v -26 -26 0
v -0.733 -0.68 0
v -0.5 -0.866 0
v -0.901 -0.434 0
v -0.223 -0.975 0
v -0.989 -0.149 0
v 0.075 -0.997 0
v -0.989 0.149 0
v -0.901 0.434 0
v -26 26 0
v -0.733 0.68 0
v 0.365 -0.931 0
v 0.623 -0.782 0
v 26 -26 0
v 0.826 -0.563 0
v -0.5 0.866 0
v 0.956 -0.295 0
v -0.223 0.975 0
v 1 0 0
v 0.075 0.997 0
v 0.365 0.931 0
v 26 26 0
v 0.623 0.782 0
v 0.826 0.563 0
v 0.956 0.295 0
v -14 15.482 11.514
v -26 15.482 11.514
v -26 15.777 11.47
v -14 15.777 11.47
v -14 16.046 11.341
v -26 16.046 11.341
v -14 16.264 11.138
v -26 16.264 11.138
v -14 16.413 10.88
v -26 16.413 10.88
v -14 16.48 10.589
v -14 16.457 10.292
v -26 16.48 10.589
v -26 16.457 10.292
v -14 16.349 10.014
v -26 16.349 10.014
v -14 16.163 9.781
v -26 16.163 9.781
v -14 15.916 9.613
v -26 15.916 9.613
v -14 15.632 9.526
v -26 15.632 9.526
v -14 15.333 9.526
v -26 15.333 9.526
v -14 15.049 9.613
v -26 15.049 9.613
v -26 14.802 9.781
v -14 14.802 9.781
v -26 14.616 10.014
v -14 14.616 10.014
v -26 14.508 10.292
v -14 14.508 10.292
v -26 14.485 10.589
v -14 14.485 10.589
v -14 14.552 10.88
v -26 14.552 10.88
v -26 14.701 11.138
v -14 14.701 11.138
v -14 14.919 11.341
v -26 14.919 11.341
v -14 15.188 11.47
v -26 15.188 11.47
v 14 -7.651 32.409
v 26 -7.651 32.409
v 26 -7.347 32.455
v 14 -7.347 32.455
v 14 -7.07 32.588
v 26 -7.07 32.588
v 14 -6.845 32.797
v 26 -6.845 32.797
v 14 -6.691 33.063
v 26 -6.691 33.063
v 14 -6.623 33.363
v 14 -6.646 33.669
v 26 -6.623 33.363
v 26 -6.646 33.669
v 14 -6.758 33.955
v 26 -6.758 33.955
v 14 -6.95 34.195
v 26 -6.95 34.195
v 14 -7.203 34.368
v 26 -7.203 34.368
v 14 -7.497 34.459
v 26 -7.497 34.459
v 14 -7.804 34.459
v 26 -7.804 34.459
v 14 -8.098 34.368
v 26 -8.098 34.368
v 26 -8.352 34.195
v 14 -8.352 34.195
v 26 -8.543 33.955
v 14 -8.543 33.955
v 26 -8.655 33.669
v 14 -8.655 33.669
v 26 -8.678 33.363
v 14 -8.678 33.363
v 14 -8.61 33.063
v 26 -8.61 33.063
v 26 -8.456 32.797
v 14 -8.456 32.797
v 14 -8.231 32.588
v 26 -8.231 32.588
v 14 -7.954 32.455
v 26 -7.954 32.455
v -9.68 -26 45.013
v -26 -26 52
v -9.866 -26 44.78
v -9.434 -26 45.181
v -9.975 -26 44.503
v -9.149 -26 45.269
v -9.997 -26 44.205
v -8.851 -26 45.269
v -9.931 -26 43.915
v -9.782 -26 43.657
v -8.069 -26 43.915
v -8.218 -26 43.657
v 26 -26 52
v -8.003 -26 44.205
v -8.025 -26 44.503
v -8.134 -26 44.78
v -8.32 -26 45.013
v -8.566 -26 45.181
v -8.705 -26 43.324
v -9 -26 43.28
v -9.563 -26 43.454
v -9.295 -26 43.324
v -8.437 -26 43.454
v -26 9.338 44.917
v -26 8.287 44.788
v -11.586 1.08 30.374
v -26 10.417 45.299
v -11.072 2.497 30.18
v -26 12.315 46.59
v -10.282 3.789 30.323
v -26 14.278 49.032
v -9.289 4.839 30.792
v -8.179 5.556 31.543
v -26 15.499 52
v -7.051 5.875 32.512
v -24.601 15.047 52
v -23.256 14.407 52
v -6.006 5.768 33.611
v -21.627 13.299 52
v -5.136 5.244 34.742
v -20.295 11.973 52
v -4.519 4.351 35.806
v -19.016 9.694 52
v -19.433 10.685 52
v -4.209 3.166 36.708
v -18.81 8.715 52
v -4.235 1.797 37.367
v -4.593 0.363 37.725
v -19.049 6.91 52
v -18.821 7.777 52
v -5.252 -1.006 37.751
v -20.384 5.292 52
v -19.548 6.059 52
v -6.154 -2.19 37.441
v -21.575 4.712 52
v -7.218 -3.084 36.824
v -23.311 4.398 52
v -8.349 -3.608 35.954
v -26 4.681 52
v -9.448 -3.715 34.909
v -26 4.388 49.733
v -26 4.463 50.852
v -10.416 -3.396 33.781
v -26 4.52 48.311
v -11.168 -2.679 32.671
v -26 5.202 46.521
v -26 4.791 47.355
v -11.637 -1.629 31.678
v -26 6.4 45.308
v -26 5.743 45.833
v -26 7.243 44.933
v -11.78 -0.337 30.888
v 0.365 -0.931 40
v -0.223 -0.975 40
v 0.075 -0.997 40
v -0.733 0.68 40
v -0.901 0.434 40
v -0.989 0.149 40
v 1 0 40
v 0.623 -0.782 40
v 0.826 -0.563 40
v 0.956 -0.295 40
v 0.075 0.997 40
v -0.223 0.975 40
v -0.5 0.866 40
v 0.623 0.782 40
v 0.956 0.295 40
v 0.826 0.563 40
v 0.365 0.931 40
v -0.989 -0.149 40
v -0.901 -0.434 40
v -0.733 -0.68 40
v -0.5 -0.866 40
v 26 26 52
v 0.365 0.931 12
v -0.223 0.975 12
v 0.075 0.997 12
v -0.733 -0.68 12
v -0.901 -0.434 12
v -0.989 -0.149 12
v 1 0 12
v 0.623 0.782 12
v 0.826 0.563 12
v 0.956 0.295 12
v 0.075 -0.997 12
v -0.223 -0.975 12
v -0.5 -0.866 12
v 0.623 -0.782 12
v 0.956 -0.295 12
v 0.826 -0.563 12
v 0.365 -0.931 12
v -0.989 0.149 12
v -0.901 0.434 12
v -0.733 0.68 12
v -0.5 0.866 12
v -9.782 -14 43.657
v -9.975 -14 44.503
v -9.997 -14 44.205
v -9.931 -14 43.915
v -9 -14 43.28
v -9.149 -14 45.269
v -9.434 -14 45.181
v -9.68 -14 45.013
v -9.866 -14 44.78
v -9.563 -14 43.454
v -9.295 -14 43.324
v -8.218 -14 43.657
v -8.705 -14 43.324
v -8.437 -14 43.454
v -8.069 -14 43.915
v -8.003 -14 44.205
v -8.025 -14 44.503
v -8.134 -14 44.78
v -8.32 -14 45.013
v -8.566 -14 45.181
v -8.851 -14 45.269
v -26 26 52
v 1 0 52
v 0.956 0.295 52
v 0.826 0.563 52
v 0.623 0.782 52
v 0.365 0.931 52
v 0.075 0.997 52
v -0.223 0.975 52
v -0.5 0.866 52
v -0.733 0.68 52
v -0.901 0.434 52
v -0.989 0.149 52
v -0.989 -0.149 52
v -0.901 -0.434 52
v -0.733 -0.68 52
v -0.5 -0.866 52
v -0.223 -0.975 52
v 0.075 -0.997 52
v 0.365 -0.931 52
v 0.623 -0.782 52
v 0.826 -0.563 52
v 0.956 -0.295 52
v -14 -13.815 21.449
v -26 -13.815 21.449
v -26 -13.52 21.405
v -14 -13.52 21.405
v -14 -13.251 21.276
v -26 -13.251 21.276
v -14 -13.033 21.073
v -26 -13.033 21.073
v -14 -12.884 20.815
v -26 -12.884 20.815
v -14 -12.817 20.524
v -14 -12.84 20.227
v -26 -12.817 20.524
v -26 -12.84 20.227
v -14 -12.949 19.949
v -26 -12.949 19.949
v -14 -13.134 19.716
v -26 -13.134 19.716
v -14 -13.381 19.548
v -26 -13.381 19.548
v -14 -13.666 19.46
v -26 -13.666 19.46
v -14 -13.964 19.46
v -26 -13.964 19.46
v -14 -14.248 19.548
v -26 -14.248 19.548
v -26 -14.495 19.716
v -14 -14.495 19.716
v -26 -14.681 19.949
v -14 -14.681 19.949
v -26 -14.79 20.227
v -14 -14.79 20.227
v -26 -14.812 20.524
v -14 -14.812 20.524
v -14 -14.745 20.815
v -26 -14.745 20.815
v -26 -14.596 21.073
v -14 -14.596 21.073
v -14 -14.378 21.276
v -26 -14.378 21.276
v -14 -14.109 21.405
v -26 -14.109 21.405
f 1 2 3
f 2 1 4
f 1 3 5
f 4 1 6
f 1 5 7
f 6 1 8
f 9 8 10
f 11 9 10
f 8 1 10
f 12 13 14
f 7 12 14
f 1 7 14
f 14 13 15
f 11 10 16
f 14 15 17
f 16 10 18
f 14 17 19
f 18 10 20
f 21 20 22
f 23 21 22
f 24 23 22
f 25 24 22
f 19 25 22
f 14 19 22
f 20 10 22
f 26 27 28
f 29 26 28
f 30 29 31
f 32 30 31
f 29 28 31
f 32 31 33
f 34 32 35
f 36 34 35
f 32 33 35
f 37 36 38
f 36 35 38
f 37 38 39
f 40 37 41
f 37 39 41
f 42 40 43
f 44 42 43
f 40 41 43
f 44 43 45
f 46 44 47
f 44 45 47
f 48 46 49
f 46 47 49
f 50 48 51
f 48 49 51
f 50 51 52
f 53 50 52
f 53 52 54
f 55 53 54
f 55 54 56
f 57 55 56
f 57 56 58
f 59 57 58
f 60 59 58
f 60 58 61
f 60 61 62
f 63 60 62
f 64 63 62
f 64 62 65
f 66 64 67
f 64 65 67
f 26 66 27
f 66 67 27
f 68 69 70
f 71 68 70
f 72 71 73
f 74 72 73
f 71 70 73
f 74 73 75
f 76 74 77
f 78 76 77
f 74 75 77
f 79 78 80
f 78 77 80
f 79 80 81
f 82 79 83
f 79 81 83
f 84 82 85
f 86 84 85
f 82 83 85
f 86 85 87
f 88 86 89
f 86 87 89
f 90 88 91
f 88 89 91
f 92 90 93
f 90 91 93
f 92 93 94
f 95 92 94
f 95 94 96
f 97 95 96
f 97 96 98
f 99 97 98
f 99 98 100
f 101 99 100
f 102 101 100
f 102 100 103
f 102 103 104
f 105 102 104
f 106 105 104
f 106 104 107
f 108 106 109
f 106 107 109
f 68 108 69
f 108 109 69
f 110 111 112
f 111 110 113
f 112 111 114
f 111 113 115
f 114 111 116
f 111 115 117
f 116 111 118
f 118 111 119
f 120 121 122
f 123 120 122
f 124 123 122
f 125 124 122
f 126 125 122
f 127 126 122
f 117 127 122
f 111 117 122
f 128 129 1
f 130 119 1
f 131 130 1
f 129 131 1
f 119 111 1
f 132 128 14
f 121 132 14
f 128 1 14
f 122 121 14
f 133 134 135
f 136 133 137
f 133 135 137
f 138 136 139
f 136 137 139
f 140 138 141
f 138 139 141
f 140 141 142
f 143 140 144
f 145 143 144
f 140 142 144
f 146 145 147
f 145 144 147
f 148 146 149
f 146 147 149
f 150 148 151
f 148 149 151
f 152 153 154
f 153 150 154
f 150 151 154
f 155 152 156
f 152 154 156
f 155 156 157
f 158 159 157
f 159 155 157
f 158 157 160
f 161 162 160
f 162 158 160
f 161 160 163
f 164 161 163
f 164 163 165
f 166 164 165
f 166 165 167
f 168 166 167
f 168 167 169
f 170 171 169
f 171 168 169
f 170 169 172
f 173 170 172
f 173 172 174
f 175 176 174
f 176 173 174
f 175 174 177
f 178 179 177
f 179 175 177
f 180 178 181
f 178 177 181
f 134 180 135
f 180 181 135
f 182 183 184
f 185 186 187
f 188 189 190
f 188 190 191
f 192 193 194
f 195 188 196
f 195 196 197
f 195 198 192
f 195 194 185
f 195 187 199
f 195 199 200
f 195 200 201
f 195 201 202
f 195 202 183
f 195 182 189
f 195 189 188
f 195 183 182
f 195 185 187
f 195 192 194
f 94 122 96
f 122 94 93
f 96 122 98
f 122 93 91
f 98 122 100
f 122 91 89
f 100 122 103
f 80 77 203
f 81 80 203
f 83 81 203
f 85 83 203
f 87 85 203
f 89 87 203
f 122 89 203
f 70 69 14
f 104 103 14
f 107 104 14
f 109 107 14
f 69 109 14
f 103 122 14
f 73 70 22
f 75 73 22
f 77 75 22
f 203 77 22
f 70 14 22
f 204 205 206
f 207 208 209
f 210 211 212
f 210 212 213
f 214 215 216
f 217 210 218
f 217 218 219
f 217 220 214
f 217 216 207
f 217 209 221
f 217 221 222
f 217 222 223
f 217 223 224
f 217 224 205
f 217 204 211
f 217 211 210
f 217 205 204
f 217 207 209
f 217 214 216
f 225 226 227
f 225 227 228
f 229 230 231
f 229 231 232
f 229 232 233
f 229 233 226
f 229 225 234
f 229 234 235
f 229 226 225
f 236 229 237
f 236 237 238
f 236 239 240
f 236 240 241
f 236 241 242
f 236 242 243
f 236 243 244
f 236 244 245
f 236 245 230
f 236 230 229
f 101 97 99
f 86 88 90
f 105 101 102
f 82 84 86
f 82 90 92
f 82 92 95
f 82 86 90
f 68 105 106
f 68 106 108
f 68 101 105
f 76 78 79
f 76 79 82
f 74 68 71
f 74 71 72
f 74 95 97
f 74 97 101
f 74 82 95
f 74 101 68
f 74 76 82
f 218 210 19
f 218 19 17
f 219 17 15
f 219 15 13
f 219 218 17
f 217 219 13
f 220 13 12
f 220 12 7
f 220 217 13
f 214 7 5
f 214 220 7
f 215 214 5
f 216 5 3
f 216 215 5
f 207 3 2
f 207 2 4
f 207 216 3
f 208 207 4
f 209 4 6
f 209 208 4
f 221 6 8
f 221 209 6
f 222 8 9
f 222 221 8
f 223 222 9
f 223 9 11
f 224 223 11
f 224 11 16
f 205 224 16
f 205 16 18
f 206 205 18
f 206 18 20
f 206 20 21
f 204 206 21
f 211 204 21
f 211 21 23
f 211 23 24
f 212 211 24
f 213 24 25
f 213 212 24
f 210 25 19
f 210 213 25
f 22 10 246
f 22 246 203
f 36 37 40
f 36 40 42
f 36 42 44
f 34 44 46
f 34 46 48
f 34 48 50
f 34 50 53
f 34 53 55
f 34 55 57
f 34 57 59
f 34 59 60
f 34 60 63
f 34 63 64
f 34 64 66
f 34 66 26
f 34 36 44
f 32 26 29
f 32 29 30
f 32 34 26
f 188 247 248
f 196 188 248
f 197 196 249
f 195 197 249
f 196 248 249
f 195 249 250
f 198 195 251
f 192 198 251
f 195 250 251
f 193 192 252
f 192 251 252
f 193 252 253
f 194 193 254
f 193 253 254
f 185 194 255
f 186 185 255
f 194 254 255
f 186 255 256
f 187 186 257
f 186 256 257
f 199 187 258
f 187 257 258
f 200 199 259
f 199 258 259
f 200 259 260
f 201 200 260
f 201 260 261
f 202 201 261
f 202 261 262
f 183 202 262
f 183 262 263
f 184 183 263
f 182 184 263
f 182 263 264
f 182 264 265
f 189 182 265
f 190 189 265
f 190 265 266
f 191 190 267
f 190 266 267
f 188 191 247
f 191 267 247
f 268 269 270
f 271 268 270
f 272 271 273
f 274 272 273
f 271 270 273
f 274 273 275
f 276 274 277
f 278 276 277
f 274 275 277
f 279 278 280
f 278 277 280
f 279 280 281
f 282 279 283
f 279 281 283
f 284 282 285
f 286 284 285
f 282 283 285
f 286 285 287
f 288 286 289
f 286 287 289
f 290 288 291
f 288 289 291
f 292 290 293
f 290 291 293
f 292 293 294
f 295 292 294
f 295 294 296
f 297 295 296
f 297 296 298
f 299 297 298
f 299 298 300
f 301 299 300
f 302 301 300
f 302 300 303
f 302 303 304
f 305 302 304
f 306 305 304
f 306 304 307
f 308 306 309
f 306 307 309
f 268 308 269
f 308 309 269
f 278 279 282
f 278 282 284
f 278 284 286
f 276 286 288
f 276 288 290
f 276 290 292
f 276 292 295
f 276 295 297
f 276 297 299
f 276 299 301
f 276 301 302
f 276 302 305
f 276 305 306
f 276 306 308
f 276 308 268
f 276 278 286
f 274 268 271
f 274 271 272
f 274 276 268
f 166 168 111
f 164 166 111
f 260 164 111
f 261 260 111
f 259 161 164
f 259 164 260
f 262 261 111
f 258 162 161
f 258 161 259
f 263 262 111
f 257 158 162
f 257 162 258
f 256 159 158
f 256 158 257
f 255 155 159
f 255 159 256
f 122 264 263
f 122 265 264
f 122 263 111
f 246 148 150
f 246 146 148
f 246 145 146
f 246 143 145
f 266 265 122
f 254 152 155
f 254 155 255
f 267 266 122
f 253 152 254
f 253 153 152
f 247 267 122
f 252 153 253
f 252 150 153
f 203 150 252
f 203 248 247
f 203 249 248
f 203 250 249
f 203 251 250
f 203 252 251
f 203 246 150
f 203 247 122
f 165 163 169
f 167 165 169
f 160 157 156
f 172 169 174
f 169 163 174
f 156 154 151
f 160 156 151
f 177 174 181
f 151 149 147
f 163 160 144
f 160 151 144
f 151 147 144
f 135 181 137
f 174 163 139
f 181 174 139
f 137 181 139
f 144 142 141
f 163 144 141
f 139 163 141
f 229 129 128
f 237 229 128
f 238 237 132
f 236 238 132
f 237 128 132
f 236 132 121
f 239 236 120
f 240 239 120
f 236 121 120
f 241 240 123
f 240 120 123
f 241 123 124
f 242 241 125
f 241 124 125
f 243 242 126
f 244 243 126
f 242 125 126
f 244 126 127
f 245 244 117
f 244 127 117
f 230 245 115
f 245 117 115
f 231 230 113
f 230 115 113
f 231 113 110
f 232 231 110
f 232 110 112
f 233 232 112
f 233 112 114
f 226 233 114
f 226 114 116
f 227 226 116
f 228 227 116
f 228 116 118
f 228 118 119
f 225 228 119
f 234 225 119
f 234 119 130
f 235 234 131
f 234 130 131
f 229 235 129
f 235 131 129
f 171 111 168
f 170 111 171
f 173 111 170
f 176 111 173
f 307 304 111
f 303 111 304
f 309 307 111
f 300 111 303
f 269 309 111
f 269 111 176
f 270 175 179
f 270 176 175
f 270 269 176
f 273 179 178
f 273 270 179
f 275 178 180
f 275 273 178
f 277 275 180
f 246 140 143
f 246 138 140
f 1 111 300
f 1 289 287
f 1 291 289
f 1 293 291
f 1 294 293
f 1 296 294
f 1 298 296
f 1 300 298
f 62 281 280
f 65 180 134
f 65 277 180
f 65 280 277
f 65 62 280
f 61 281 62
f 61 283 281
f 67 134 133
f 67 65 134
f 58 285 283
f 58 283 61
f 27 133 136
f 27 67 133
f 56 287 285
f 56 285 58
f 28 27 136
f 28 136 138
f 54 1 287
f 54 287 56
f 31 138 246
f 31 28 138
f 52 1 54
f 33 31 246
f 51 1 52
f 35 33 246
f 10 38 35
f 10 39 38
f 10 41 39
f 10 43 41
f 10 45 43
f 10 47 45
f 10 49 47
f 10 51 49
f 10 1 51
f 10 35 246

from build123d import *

# Parameters (mm, degrees)
SQUARE_W             = 52
SQUARE_H             = 52
CUBE_EXTRUSION_DEPTH = 52
STICK_CUT_START      = 15
STICK_HOLE_R         = 5.1
STICK_CUT_DEPTH      = 90.048032459
SKETCH12_R           = 1
CUT_EXTRUDE8_DEPTH   = 12
CUT_EXTRUDE9_START   = -12
SKETCH13_R           = 1
CUT_EXTRUDE9_DEPTH   = 12
SKETCH14_R           = 1
CUT_EXTRUDE10_DEPTH  = 12
SKETCH15_R           = 1.030667793
CUT_EXTRUDE11_DEPTH  = 12
SKETCH16_R           = 1
CUT_EXTRUDE12_DEPTH  = 12


with BuildPart() as part:
    # Square → Cube-Extrusion (new body)
    with BuildSketch(Plane.XY):
        Rectangle(SQUARE_W, SQUARE_H)
    extrude(amount=CUBE_EXTRUSION_DEPTH)

    # Stick-Hole → Stick-Cut (cut, through all)
    with BuildSketch(Plane(origin=(-28.888888889, 14.444444444, 28.888888889), x_dir=(-0.7453559924999299, -0.2981423969999719, -0.596284793999944), z_dir=(0.6666666666666667, -0.3333333333333332, -0.6666666666666667)).offset(STICK_CUT_START)):
        with Locations(Location((-14.635839315, -14.230249471, 0), (0, 0, 18.434948823))):
            Circle(STICK_HOLE_R)
    extrude(amount=-STICK_CUT_DEPTH, mode=Mode.SUBTRACT)

    # Sketch12 → Cut-Extrude8 (cut)
    with BuildSketch(Plane.XY.offset(52)):
        Circle(SKETCH12_R)
    extrude(amount=-CUT_EXTRUDE8_DEPTH, mode=Mode.SUBTRACT)

    # Sketch13 → Cut-Extrude9 (cut)
    with BuildSketch(Plane(origin=(0, 0, 0), x_dir=(-1, 0, 0), z_dir=(0, 0, -1)).offset(CUT_EXTRUDE9_START)):
        with Locations(Location((0, 0, 0), (0, 0, 180))):
            Circle(SKETCH13_R)
    extrude(amount=CUT_EXTRUDE9_DEPTH, mode=Mode.SUBTRACT)

    # Sketch14 → Cut-Extrude10 (cut)
    with BuildSketch(Plane.ZY.offset(26)):
        with Locations((10.514408983, 15.48249327)):
            Circle(SKETCH14_R)
        with Locations((20.449310987, -13.814590013)):
            Circle(SKETCH14_R)
    extrude(amount=-CUT_EXTRUDE10_DEPTH, mode=Mode.SUBTRACT)

    # Sketch15 → Cut-Extrude11 (cut)
    with BuildSketch(Plane(origin=(26, 0, 0), x_dir=(0, 0, -1), z_dir=(1, 0, 0))):
        with Locations((-33.439884797, -7.650599719)):
            Circle(SKETCH15_R)
    extrude(amount=-CUT_EXTRUDE11_DEPTH, mode=Mode.SUBTRACT)

    # Sketch16 → Cut-Extrude12 (cut)
    with BuildSketch(Plane.XZ.offset(26)):
        with Locations(Location((-9, 44.28, 0), (0, 0, 270))):
            Circle(SKETCH16_R)
    extrude(amount=-CUT_EXTRUDE12_DEPTH, mode=Mode.SUBTRACT)


solid = part.part
